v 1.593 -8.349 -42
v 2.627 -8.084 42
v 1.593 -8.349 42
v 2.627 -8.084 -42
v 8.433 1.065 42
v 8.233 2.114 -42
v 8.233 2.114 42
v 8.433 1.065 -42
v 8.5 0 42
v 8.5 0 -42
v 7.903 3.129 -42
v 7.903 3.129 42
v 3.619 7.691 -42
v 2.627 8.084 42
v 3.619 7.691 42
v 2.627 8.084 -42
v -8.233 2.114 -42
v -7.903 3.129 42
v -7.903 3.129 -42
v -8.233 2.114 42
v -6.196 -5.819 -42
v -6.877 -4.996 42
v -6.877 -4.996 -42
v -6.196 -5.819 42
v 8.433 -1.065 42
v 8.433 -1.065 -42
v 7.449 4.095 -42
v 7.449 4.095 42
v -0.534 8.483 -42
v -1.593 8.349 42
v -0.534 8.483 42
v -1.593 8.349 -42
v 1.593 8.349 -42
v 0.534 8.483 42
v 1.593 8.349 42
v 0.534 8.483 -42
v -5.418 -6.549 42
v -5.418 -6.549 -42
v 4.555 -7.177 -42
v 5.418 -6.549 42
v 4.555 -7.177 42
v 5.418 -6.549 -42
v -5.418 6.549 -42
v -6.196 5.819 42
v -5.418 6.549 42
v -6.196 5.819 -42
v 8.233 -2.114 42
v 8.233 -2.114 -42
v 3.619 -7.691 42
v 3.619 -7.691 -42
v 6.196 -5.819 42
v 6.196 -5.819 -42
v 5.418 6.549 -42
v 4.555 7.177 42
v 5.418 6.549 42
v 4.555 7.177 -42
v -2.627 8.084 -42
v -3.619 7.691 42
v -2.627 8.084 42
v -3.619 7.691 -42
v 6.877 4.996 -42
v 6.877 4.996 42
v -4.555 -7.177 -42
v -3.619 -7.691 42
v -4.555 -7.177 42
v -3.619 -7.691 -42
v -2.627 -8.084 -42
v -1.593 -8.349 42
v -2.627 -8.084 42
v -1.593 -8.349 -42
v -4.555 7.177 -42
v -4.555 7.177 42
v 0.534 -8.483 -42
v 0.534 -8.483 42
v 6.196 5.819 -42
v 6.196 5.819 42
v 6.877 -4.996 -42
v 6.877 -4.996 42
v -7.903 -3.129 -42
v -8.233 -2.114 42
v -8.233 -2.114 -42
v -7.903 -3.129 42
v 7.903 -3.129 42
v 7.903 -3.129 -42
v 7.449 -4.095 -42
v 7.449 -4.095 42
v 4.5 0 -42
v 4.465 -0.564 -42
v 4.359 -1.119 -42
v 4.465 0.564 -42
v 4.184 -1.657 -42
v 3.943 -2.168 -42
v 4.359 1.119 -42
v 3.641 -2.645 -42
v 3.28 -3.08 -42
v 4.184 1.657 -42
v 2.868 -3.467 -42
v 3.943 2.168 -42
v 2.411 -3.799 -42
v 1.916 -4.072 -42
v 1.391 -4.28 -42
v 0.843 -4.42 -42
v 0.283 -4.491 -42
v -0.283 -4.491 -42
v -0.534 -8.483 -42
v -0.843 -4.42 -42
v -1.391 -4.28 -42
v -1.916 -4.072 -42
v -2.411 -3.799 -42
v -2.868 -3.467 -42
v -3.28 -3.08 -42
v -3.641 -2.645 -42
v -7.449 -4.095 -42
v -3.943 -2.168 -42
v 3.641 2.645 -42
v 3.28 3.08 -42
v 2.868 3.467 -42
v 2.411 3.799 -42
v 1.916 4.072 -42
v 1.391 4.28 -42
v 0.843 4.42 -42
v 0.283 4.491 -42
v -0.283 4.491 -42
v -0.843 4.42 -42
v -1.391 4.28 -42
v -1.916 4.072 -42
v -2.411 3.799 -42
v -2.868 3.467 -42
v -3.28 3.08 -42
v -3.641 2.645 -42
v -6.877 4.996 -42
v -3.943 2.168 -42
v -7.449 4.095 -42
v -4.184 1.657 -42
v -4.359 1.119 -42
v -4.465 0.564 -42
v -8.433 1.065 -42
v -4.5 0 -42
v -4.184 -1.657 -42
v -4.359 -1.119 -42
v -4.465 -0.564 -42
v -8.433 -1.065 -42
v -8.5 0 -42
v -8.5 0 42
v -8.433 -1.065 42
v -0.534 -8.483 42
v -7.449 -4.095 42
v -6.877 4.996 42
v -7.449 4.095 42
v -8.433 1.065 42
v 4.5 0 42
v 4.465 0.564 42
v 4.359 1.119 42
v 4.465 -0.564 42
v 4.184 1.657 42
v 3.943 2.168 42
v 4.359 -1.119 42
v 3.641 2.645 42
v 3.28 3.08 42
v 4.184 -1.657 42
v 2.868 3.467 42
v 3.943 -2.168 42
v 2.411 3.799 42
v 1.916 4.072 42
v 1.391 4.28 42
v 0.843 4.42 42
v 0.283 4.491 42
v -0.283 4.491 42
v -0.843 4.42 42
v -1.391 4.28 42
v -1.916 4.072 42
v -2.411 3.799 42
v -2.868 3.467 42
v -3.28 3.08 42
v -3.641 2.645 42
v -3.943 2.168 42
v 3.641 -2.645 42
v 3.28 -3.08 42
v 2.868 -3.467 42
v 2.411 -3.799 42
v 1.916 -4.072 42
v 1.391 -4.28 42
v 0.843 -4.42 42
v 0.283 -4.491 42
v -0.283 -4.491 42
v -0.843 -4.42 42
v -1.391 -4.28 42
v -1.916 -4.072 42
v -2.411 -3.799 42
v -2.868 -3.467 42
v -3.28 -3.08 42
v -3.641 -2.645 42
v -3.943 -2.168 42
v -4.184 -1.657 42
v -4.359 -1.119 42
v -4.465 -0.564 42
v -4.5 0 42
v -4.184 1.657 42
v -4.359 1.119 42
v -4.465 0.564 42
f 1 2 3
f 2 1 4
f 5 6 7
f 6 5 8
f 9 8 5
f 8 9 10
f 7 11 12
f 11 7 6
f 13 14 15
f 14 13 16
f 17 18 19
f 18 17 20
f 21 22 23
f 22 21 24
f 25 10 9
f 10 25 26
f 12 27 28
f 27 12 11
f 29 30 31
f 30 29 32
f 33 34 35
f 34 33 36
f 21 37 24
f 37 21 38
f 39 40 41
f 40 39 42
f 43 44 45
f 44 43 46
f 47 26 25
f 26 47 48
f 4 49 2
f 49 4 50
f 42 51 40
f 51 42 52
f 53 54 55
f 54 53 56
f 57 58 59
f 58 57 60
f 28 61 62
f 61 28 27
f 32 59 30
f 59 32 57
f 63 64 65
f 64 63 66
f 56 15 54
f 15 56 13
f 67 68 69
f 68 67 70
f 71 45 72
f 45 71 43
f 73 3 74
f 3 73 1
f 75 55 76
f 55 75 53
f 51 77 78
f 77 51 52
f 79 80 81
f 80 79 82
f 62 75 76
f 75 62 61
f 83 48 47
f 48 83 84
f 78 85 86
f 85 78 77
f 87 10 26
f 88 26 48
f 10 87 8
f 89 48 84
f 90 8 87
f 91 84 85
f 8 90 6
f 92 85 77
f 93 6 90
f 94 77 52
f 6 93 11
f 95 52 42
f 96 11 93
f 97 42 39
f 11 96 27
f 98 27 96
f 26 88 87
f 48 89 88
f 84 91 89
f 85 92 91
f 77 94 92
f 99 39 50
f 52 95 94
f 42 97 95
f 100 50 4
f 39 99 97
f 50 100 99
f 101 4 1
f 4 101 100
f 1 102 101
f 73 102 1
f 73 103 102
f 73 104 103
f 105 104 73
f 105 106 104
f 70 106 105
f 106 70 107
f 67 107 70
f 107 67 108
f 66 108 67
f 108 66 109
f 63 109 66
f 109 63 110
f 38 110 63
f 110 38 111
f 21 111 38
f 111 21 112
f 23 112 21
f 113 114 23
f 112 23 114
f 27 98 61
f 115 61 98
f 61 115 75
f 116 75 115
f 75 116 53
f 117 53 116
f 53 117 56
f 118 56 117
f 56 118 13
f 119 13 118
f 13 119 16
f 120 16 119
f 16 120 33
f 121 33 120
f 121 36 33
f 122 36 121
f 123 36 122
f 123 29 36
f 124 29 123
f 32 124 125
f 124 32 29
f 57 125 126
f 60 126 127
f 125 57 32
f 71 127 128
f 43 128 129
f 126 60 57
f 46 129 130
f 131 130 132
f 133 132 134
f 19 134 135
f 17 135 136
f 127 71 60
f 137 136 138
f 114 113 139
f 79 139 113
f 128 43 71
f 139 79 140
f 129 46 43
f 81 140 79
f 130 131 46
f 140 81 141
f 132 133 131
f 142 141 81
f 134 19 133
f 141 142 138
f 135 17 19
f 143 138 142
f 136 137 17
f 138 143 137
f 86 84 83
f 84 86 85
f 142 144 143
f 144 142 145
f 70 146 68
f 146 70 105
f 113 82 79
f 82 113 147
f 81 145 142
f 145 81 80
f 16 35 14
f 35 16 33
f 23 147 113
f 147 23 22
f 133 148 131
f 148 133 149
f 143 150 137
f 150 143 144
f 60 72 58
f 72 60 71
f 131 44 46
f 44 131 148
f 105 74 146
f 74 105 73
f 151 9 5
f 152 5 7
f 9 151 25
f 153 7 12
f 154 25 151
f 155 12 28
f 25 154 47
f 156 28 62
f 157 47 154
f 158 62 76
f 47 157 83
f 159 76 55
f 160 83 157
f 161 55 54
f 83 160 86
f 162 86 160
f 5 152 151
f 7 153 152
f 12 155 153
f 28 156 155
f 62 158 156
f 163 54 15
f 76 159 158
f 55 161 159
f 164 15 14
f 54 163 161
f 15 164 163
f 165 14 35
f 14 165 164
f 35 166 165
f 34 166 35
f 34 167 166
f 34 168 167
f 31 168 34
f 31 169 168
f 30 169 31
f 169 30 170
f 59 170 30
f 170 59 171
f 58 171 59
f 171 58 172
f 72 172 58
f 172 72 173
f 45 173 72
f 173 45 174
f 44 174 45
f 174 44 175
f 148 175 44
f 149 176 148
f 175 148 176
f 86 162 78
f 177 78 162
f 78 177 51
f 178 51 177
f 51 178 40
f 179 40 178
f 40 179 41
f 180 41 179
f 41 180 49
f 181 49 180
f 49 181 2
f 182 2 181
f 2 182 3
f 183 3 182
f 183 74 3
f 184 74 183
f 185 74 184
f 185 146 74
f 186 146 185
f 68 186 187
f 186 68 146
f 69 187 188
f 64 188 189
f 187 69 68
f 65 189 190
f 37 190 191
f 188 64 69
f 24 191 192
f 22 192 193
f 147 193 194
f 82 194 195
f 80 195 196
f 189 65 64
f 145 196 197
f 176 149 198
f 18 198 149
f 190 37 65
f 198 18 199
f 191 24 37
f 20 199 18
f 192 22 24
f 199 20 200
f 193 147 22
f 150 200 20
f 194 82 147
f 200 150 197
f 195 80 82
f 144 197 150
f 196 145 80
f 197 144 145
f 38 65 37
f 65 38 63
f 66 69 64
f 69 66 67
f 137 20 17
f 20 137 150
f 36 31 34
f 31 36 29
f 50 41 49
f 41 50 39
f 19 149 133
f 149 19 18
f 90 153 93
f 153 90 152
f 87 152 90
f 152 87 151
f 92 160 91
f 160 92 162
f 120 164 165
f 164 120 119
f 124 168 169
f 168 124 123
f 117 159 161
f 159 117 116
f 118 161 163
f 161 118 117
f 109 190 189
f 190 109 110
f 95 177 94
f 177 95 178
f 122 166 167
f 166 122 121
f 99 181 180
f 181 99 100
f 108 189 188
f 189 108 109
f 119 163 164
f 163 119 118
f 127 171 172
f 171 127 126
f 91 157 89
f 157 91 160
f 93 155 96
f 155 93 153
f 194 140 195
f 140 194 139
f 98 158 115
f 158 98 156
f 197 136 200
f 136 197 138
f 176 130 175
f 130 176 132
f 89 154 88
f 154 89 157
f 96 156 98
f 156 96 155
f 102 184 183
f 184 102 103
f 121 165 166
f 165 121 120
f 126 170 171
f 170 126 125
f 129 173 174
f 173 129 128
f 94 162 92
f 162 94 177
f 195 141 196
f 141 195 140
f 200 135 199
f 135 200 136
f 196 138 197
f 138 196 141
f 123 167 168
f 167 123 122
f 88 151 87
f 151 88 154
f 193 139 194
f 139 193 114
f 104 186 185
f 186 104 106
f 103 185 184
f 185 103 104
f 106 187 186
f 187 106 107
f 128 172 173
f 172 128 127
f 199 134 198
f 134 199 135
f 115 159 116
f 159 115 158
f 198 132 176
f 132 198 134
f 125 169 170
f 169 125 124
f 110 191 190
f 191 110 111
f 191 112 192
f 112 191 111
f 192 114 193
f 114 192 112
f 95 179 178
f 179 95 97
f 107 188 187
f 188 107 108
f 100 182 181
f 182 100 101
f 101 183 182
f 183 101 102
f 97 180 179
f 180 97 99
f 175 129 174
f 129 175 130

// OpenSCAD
$fn = 50;


difference() {
	union() {
		translate(v = [0, 0, -42.0000000000]) {
			cylinder(h = 84, r = 8.5000000000);
		}
	}
	union() {
		translate(v = [0, 0, -100.0000000000]) {
			cylinder(h = 200, r = 4.5000000000);
		}
	}
}
